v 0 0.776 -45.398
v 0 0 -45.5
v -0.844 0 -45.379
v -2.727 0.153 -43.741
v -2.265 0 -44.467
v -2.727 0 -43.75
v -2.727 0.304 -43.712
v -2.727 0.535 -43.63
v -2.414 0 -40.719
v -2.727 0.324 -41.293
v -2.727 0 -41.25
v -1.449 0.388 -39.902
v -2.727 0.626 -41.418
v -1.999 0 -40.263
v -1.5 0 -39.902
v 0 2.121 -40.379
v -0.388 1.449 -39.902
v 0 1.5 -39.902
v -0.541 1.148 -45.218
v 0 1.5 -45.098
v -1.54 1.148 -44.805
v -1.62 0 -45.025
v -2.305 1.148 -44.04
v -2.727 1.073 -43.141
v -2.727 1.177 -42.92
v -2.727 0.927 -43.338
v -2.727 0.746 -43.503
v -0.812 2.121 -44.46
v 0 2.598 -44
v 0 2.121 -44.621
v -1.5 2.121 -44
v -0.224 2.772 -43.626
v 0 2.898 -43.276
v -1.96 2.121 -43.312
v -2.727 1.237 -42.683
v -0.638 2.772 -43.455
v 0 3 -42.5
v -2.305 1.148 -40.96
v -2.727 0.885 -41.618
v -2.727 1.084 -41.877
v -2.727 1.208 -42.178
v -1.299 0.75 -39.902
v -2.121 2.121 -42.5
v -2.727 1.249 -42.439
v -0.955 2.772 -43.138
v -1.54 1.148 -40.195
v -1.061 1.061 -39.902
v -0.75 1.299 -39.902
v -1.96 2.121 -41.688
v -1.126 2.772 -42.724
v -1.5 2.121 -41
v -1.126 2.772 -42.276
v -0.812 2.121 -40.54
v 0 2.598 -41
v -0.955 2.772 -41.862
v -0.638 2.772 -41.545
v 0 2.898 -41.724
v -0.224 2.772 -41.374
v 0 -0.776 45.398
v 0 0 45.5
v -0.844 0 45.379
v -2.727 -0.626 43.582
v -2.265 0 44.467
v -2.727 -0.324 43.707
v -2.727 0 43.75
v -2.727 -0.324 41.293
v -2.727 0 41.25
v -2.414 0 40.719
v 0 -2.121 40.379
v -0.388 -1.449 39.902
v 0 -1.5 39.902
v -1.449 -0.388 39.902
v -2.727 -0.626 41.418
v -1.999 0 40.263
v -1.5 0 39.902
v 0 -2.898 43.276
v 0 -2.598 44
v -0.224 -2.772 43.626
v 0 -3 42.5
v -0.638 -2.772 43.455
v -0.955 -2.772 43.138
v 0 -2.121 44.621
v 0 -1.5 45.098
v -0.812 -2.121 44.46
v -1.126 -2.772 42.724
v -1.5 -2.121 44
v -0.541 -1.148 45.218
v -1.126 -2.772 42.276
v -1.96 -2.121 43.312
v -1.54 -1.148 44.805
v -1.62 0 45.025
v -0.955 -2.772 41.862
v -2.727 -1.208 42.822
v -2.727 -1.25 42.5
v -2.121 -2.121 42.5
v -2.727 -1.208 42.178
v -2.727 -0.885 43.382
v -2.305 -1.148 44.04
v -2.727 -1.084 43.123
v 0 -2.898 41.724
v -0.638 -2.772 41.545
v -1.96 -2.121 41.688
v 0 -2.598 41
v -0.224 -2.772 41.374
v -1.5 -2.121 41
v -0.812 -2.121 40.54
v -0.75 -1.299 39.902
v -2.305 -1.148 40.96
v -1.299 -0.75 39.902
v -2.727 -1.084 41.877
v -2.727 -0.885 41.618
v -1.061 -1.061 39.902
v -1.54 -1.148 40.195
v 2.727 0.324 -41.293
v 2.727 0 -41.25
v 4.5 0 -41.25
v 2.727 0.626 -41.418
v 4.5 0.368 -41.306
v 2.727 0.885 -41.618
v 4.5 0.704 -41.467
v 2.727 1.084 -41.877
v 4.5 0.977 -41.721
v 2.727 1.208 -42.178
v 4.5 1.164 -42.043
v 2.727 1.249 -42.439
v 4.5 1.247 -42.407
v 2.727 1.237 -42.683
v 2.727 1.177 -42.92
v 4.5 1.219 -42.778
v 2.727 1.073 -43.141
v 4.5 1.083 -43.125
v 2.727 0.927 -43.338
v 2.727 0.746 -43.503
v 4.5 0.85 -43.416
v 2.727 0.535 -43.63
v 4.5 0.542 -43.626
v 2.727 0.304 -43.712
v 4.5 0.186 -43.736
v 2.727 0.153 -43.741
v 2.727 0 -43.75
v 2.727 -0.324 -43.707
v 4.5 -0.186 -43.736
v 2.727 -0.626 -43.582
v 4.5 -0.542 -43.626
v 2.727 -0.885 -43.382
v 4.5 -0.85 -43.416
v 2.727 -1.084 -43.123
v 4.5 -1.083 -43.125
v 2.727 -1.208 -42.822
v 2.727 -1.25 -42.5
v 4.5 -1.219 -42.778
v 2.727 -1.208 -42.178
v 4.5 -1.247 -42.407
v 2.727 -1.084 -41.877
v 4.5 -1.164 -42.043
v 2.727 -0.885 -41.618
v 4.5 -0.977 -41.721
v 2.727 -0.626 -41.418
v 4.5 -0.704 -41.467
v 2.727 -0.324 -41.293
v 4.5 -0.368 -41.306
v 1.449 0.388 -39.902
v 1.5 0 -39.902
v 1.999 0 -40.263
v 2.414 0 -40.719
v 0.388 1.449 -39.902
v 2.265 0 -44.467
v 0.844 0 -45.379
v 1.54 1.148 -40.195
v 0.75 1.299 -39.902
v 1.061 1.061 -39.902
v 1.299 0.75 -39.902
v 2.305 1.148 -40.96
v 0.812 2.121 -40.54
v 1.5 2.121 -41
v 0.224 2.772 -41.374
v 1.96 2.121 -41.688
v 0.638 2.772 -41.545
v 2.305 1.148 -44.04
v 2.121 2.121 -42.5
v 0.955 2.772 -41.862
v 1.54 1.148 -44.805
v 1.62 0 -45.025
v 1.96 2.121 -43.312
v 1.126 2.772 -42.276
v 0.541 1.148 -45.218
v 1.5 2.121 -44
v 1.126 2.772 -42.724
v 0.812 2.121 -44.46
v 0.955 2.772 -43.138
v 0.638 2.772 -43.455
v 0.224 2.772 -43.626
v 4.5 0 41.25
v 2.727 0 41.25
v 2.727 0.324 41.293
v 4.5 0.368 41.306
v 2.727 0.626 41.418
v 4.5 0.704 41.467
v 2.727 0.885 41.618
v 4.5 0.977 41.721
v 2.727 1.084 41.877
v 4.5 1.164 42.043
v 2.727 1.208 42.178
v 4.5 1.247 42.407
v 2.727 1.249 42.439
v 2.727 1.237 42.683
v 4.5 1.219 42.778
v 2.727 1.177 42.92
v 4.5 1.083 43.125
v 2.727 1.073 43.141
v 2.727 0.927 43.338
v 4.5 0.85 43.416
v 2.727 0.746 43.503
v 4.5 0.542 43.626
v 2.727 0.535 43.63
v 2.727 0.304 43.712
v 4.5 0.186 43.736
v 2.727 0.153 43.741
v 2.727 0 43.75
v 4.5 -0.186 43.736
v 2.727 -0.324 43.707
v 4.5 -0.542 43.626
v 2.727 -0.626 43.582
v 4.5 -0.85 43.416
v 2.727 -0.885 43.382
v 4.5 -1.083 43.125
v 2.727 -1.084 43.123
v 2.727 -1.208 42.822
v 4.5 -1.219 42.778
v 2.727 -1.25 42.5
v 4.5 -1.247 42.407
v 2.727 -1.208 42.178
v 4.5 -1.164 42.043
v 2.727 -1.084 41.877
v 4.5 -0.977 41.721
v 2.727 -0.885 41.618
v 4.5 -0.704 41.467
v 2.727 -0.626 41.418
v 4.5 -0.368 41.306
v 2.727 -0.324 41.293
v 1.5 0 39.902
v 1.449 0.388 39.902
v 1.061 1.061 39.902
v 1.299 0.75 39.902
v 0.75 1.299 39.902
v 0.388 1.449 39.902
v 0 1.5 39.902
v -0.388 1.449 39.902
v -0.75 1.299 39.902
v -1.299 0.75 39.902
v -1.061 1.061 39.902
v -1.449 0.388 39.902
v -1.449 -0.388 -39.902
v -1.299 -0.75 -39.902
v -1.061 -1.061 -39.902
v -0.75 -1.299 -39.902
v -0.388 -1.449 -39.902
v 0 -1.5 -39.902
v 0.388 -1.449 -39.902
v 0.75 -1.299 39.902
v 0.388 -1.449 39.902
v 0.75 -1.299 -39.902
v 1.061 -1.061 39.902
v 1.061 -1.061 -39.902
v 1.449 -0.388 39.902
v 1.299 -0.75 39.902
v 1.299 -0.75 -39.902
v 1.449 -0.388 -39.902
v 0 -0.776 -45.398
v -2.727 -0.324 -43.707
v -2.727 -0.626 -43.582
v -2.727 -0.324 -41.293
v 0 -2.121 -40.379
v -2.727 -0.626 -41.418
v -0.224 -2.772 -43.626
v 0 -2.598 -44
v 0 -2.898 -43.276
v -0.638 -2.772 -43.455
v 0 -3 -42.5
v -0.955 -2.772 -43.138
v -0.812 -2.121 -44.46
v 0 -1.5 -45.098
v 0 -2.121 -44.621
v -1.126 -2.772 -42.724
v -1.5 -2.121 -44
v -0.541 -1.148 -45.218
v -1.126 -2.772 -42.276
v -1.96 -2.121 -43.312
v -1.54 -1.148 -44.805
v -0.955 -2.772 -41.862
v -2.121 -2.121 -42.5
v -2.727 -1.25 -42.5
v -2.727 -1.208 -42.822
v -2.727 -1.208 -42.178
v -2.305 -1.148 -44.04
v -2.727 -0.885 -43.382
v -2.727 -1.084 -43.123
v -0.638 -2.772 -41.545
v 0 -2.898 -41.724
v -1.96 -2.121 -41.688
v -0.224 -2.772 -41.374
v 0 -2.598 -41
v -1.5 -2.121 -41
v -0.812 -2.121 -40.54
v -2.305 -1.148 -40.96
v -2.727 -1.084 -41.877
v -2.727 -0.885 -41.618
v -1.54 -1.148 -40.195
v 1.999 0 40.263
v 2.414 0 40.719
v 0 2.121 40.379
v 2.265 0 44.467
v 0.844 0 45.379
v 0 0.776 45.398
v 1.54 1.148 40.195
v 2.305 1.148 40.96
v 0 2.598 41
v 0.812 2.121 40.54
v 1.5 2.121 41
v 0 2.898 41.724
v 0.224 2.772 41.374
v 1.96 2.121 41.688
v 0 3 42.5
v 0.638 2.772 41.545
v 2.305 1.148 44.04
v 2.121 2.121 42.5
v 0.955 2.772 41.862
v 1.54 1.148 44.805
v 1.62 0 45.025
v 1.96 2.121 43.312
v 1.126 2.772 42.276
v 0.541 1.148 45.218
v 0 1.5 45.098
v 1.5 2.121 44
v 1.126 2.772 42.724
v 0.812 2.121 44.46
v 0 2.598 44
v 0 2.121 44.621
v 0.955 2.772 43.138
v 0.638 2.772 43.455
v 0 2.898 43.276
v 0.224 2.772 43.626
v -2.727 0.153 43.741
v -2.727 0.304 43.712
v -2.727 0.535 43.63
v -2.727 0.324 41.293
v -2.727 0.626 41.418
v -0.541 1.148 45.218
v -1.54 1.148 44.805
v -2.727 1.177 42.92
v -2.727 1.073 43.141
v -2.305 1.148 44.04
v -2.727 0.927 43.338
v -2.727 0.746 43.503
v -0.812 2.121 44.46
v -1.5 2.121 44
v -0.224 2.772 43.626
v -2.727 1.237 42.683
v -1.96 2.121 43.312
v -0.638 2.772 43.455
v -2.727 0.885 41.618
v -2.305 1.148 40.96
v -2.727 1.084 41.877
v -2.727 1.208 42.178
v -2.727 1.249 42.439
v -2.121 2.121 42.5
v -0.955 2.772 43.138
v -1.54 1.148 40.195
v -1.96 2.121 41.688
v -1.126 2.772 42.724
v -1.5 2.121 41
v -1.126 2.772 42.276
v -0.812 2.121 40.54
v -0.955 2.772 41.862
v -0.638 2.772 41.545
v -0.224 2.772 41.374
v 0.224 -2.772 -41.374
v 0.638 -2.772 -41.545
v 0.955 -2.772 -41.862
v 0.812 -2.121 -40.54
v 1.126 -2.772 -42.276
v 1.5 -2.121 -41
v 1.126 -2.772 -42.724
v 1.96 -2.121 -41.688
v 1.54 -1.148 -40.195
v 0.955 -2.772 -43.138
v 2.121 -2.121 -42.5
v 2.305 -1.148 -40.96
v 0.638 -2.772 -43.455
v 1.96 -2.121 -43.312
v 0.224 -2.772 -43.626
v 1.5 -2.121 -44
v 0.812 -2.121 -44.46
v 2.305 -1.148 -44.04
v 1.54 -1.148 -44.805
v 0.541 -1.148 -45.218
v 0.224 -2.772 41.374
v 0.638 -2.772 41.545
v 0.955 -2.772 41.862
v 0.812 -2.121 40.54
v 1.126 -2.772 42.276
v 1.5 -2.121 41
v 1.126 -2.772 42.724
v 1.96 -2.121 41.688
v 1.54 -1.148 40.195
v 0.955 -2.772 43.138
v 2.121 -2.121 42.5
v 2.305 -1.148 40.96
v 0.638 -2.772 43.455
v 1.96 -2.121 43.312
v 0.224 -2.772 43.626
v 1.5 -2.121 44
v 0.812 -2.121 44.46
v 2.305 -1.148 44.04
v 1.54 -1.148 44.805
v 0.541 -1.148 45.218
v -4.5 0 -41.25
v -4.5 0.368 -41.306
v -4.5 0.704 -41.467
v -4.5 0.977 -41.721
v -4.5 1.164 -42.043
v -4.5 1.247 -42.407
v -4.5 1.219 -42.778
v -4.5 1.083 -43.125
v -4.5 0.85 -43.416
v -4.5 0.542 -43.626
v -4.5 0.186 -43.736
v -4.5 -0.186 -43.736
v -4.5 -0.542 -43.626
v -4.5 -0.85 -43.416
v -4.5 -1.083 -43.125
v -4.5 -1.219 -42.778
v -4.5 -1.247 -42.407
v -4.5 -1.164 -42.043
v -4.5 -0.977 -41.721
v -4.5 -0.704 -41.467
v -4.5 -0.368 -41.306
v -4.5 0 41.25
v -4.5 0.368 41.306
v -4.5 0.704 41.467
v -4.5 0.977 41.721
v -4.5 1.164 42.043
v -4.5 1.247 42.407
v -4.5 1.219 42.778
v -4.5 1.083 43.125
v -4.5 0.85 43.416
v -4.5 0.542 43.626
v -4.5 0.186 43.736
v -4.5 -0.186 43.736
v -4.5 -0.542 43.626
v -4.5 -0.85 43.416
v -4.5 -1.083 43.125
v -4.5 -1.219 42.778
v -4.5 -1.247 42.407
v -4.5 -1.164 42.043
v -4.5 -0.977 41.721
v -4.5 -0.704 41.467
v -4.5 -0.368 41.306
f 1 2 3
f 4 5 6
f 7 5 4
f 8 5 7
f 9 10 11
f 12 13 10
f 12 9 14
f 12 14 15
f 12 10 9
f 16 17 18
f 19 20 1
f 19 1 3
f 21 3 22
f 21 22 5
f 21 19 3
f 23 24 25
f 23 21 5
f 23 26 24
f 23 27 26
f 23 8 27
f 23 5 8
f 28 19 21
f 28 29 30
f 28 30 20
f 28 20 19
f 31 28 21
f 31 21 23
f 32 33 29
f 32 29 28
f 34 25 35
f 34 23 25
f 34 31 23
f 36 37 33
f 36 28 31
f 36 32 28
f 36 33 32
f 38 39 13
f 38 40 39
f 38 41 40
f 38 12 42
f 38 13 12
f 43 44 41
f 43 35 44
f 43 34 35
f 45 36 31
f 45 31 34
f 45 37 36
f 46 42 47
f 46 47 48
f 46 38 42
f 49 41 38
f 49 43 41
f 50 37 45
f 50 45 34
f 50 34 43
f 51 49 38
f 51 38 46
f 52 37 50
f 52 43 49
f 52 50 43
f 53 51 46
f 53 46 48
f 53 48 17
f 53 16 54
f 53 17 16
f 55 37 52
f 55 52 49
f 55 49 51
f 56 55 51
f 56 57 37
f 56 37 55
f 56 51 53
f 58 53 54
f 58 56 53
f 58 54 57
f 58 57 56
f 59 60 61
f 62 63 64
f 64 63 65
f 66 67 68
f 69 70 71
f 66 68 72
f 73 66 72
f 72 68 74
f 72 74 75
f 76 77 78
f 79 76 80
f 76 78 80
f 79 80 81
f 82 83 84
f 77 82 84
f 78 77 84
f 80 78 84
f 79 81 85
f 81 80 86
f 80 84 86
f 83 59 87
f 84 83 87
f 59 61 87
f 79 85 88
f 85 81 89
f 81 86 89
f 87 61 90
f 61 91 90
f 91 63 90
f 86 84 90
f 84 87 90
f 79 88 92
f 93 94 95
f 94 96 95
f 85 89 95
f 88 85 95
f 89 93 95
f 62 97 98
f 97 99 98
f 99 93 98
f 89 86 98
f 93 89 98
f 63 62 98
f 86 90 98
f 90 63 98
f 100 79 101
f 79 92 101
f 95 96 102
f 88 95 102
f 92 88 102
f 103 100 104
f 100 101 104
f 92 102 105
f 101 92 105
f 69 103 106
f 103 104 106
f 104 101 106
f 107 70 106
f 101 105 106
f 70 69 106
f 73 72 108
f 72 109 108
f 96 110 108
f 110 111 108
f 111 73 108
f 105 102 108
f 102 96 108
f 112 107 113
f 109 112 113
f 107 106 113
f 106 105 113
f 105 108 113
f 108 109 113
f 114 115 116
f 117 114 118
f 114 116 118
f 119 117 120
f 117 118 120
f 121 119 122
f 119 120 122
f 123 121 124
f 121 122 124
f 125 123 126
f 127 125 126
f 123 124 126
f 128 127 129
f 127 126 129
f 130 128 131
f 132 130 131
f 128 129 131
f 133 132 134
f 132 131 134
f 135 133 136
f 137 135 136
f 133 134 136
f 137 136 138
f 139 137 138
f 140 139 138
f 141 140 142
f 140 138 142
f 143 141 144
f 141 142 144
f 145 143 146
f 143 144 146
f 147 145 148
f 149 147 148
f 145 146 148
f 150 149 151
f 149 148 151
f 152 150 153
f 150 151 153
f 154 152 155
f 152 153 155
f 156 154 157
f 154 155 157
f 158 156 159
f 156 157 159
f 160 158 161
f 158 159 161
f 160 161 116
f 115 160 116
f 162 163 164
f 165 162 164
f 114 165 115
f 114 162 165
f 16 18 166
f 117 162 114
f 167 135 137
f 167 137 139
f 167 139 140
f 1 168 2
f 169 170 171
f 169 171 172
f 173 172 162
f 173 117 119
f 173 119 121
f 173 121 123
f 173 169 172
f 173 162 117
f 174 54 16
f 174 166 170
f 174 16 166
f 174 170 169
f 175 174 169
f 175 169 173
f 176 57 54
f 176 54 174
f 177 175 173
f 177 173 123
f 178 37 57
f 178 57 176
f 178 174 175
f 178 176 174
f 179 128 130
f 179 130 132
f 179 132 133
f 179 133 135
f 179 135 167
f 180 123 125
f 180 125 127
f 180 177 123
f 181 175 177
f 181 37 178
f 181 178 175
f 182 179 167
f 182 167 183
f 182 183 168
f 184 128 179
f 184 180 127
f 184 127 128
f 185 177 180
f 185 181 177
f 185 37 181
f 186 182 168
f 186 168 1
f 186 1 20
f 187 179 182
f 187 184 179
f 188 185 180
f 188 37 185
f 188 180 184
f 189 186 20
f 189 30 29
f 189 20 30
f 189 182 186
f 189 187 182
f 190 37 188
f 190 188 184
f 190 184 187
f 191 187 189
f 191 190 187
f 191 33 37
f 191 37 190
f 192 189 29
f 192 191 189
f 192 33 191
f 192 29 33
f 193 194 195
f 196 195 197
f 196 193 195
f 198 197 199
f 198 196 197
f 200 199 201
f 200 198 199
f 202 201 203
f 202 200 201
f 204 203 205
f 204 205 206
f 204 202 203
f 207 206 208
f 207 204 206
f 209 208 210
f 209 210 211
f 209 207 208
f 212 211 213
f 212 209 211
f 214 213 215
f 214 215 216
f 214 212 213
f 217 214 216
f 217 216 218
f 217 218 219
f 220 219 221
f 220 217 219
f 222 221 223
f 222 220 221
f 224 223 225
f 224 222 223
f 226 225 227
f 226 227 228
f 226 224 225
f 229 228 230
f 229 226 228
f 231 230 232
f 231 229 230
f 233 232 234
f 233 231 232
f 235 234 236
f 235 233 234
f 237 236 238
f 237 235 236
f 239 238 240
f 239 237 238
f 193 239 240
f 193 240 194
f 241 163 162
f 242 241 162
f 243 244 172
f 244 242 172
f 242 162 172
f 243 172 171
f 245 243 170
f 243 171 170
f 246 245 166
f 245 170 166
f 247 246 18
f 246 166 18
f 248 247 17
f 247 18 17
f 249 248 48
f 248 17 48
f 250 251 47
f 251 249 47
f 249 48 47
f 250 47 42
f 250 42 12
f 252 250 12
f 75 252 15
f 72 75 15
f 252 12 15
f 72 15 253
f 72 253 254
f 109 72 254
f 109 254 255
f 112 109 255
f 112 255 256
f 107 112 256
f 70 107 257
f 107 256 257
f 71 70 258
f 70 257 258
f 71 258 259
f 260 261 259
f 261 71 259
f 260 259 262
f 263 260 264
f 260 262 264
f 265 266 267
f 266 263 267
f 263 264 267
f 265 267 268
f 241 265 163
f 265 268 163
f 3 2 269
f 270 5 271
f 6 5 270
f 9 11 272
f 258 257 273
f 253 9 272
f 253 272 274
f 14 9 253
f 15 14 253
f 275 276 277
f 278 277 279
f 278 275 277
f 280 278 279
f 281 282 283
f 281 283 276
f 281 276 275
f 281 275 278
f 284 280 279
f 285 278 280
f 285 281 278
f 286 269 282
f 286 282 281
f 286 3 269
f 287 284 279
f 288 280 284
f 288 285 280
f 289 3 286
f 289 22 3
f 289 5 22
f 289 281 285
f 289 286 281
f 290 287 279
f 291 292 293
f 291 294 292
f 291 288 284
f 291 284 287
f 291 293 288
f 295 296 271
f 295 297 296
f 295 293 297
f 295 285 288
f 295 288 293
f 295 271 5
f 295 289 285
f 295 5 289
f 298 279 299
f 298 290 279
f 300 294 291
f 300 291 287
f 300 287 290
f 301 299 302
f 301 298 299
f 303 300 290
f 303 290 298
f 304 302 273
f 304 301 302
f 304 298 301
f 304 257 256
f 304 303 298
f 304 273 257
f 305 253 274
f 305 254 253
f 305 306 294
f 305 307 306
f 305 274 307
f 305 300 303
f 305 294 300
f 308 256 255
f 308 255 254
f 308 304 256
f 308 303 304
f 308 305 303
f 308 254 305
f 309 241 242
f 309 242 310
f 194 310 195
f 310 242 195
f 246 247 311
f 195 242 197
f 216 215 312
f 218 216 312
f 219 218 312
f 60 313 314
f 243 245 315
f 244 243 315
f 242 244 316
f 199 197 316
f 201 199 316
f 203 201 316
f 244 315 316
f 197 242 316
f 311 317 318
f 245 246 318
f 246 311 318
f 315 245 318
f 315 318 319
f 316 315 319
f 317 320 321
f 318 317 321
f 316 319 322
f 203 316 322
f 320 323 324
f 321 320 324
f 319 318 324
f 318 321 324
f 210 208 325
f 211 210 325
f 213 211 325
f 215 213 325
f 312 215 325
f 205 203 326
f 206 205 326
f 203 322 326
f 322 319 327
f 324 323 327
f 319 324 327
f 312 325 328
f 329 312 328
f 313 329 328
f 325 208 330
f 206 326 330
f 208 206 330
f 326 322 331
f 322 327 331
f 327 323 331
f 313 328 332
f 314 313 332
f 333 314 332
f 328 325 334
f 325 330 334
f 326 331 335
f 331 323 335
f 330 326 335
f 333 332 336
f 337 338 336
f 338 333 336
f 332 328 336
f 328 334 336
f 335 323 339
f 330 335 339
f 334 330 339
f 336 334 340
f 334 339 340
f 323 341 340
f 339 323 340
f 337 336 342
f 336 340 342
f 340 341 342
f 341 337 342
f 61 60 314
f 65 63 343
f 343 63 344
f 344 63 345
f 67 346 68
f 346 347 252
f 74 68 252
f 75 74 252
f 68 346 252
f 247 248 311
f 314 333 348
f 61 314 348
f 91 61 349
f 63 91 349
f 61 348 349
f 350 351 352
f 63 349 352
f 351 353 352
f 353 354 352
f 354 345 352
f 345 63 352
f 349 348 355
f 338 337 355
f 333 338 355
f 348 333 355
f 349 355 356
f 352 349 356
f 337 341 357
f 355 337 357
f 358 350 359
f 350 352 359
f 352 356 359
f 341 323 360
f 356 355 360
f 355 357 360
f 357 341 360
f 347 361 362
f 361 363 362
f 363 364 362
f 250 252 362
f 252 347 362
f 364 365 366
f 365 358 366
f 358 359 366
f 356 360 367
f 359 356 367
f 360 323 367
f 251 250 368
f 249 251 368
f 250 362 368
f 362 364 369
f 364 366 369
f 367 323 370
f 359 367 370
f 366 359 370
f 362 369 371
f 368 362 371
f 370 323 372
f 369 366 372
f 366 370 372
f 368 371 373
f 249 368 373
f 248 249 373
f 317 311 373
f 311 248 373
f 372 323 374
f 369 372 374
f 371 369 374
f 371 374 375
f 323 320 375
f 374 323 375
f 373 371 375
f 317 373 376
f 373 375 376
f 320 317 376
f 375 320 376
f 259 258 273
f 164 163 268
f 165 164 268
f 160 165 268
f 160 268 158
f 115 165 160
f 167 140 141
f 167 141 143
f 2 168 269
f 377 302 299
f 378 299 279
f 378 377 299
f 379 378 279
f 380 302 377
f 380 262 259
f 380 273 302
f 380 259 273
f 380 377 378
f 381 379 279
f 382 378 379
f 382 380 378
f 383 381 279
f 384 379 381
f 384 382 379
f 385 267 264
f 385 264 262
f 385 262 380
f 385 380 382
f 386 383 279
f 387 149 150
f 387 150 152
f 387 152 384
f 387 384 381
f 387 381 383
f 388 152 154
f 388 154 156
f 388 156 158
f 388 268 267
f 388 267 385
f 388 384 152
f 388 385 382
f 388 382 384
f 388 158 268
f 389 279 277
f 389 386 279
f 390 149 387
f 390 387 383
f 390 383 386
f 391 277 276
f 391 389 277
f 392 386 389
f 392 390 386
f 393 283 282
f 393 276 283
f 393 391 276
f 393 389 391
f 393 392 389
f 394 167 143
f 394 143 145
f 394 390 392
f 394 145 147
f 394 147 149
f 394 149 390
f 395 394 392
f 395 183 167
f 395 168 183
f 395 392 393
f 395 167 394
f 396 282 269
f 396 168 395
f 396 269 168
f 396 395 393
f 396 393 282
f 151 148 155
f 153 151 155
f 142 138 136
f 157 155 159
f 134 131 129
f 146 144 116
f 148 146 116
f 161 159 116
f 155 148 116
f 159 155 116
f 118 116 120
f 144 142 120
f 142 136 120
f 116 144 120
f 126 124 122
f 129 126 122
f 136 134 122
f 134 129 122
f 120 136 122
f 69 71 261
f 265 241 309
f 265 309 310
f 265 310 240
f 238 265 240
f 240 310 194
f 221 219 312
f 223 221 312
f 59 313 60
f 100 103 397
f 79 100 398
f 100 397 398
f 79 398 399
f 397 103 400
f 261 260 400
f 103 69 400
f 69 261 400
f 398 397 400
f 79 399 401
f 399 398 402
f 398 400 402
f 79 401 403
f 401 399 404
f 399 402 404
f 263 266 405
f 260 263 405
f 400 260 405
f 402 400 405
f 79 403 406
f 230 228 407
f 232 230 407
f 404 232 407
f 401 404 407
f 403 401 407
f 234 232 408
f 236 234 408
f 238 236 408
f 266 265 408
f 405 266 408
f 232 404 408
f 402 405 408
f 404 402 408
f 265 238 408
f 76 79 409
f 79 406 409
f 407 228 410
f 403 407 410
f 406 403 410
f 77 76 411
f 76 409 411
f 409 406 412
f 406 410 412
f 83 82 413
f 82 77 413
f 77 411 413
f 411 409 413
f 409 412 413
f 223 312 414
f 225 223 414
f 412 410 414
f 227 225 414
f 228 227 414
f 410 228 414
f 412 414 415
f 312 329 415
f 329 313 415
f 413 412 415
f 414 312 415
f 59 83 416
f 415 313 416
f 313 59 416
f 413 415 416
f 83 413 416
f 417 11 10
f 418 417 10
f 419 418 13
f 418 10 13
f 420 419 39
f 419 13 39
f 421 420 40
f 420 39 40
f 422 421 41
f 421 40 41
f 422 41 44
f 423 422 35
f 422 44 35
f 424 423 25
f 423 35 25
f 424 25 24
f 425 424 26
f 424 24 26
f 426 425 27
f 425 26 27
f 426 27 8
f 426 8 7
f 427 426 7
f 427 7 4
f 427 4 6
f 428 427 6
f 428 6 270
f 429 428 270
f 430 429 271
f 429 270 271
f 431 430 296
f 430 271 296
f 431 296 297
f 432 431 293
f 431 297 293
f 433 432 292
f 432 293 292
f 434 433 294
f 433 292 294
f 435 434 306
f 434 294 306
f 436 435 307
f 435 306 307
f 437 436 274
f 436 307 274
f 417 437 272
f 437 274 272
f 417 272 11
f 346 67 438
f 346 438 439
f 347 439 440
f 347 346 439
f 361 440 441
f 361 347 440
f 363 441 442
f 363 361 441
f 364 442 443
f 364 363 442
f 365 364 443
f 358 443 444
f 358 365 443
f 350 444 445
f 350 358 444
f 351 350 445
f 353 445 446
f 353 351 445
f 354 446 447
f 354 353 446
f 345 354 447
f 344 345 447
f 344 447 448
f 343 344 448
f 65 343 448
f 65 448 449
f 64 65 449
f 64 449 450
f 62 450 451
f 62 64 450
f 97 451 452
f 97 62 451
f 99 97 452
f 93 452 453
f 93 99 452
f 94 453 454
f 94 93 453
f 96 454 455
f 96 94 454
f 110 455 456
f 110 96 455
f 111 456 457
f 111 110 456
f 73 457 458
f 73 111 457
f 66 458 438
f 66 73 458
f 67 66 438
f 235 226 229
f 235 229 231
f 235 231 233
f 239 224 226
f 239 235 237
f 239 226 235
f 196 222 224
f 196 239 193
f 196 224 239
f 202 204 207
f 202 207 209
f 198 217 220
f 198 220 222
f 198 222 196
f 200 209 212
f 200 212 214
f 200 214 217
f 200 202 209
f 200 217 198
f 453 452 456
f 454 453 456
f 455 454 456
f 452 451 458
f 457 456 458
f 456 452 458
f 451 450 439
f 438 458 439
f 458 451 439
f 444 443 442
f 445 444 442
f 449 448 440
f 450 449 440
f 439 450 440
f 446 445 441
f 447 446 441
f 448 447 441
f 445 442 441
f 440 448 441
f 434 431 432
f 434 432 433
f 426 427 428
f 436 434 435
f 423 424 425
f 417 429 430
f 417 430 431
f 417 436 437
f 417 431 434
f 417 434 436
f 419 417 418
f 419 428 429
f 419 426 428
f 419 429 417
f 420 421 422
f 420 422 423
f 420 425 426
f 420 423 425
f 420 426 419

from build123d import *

# Parameters (mm, degrees)
BOSS_EXTRUDE1_DEPTH      = 42.5
BOSS_EXTRUDE1_DEPTH_BACK = 42.5
SKETCH1_R                = 1.5
SKETCH3_R                = 1.25
BOSS_EXTRUDE2_DEPTH      = 4.5


with BuildPart() as part:
    # Sketch1 → Boss-Extrude1 (new, two sides: drawn at the far end of the back side and taken through both)
    with BuildSketch(Plane.XY.offset(-BOSS_EXTRUDE1_DEPTH_BACK)):
        Circle(SKETCH1_R)
    extrude(amount=BOSS_EXTRUDE1_DEPTH + BOSS_EXTRUDE1_DEPTH_BACK)

    # Sketch2 → Revolve1 (revolve)
    with BuildSketch(Plane(origin=(0, 0, 0), x_dir=(0, 0, -1), z_dir=(1, 0, 0))):
        with BuildLine():
            Line((-42.5, -3), (-42.5, 3))
            ThreePointArc((-42.5, 3), (-45.5, 0), (-42.5, -3))
        make_face()
    revolve1 = revolve(axis=Axis((0, 3, 42.5), (0, -1, 0)))

    # Sketch3 → Boss-Extrude2 (add, symmetric)
    with BuildSketch(Plane(origin=(0, 0, 0), x_dir=(0, 0, -1), z_dir=(1, 0, 0))):
        with Locations((-42.5, 0)):
            Circle(SKETCH3_R)
    boss_extrude2 = extrude(amount=BOSS_EXTRUDE2_DEPTH, both=True)

    # Mirror1: Revolve1, Boss-Extrude2 across plane
    add(revolve1.mirror(Plane.XY))
    add(boss_extrude2.mirror(Plane.XY))


solid = part.part
